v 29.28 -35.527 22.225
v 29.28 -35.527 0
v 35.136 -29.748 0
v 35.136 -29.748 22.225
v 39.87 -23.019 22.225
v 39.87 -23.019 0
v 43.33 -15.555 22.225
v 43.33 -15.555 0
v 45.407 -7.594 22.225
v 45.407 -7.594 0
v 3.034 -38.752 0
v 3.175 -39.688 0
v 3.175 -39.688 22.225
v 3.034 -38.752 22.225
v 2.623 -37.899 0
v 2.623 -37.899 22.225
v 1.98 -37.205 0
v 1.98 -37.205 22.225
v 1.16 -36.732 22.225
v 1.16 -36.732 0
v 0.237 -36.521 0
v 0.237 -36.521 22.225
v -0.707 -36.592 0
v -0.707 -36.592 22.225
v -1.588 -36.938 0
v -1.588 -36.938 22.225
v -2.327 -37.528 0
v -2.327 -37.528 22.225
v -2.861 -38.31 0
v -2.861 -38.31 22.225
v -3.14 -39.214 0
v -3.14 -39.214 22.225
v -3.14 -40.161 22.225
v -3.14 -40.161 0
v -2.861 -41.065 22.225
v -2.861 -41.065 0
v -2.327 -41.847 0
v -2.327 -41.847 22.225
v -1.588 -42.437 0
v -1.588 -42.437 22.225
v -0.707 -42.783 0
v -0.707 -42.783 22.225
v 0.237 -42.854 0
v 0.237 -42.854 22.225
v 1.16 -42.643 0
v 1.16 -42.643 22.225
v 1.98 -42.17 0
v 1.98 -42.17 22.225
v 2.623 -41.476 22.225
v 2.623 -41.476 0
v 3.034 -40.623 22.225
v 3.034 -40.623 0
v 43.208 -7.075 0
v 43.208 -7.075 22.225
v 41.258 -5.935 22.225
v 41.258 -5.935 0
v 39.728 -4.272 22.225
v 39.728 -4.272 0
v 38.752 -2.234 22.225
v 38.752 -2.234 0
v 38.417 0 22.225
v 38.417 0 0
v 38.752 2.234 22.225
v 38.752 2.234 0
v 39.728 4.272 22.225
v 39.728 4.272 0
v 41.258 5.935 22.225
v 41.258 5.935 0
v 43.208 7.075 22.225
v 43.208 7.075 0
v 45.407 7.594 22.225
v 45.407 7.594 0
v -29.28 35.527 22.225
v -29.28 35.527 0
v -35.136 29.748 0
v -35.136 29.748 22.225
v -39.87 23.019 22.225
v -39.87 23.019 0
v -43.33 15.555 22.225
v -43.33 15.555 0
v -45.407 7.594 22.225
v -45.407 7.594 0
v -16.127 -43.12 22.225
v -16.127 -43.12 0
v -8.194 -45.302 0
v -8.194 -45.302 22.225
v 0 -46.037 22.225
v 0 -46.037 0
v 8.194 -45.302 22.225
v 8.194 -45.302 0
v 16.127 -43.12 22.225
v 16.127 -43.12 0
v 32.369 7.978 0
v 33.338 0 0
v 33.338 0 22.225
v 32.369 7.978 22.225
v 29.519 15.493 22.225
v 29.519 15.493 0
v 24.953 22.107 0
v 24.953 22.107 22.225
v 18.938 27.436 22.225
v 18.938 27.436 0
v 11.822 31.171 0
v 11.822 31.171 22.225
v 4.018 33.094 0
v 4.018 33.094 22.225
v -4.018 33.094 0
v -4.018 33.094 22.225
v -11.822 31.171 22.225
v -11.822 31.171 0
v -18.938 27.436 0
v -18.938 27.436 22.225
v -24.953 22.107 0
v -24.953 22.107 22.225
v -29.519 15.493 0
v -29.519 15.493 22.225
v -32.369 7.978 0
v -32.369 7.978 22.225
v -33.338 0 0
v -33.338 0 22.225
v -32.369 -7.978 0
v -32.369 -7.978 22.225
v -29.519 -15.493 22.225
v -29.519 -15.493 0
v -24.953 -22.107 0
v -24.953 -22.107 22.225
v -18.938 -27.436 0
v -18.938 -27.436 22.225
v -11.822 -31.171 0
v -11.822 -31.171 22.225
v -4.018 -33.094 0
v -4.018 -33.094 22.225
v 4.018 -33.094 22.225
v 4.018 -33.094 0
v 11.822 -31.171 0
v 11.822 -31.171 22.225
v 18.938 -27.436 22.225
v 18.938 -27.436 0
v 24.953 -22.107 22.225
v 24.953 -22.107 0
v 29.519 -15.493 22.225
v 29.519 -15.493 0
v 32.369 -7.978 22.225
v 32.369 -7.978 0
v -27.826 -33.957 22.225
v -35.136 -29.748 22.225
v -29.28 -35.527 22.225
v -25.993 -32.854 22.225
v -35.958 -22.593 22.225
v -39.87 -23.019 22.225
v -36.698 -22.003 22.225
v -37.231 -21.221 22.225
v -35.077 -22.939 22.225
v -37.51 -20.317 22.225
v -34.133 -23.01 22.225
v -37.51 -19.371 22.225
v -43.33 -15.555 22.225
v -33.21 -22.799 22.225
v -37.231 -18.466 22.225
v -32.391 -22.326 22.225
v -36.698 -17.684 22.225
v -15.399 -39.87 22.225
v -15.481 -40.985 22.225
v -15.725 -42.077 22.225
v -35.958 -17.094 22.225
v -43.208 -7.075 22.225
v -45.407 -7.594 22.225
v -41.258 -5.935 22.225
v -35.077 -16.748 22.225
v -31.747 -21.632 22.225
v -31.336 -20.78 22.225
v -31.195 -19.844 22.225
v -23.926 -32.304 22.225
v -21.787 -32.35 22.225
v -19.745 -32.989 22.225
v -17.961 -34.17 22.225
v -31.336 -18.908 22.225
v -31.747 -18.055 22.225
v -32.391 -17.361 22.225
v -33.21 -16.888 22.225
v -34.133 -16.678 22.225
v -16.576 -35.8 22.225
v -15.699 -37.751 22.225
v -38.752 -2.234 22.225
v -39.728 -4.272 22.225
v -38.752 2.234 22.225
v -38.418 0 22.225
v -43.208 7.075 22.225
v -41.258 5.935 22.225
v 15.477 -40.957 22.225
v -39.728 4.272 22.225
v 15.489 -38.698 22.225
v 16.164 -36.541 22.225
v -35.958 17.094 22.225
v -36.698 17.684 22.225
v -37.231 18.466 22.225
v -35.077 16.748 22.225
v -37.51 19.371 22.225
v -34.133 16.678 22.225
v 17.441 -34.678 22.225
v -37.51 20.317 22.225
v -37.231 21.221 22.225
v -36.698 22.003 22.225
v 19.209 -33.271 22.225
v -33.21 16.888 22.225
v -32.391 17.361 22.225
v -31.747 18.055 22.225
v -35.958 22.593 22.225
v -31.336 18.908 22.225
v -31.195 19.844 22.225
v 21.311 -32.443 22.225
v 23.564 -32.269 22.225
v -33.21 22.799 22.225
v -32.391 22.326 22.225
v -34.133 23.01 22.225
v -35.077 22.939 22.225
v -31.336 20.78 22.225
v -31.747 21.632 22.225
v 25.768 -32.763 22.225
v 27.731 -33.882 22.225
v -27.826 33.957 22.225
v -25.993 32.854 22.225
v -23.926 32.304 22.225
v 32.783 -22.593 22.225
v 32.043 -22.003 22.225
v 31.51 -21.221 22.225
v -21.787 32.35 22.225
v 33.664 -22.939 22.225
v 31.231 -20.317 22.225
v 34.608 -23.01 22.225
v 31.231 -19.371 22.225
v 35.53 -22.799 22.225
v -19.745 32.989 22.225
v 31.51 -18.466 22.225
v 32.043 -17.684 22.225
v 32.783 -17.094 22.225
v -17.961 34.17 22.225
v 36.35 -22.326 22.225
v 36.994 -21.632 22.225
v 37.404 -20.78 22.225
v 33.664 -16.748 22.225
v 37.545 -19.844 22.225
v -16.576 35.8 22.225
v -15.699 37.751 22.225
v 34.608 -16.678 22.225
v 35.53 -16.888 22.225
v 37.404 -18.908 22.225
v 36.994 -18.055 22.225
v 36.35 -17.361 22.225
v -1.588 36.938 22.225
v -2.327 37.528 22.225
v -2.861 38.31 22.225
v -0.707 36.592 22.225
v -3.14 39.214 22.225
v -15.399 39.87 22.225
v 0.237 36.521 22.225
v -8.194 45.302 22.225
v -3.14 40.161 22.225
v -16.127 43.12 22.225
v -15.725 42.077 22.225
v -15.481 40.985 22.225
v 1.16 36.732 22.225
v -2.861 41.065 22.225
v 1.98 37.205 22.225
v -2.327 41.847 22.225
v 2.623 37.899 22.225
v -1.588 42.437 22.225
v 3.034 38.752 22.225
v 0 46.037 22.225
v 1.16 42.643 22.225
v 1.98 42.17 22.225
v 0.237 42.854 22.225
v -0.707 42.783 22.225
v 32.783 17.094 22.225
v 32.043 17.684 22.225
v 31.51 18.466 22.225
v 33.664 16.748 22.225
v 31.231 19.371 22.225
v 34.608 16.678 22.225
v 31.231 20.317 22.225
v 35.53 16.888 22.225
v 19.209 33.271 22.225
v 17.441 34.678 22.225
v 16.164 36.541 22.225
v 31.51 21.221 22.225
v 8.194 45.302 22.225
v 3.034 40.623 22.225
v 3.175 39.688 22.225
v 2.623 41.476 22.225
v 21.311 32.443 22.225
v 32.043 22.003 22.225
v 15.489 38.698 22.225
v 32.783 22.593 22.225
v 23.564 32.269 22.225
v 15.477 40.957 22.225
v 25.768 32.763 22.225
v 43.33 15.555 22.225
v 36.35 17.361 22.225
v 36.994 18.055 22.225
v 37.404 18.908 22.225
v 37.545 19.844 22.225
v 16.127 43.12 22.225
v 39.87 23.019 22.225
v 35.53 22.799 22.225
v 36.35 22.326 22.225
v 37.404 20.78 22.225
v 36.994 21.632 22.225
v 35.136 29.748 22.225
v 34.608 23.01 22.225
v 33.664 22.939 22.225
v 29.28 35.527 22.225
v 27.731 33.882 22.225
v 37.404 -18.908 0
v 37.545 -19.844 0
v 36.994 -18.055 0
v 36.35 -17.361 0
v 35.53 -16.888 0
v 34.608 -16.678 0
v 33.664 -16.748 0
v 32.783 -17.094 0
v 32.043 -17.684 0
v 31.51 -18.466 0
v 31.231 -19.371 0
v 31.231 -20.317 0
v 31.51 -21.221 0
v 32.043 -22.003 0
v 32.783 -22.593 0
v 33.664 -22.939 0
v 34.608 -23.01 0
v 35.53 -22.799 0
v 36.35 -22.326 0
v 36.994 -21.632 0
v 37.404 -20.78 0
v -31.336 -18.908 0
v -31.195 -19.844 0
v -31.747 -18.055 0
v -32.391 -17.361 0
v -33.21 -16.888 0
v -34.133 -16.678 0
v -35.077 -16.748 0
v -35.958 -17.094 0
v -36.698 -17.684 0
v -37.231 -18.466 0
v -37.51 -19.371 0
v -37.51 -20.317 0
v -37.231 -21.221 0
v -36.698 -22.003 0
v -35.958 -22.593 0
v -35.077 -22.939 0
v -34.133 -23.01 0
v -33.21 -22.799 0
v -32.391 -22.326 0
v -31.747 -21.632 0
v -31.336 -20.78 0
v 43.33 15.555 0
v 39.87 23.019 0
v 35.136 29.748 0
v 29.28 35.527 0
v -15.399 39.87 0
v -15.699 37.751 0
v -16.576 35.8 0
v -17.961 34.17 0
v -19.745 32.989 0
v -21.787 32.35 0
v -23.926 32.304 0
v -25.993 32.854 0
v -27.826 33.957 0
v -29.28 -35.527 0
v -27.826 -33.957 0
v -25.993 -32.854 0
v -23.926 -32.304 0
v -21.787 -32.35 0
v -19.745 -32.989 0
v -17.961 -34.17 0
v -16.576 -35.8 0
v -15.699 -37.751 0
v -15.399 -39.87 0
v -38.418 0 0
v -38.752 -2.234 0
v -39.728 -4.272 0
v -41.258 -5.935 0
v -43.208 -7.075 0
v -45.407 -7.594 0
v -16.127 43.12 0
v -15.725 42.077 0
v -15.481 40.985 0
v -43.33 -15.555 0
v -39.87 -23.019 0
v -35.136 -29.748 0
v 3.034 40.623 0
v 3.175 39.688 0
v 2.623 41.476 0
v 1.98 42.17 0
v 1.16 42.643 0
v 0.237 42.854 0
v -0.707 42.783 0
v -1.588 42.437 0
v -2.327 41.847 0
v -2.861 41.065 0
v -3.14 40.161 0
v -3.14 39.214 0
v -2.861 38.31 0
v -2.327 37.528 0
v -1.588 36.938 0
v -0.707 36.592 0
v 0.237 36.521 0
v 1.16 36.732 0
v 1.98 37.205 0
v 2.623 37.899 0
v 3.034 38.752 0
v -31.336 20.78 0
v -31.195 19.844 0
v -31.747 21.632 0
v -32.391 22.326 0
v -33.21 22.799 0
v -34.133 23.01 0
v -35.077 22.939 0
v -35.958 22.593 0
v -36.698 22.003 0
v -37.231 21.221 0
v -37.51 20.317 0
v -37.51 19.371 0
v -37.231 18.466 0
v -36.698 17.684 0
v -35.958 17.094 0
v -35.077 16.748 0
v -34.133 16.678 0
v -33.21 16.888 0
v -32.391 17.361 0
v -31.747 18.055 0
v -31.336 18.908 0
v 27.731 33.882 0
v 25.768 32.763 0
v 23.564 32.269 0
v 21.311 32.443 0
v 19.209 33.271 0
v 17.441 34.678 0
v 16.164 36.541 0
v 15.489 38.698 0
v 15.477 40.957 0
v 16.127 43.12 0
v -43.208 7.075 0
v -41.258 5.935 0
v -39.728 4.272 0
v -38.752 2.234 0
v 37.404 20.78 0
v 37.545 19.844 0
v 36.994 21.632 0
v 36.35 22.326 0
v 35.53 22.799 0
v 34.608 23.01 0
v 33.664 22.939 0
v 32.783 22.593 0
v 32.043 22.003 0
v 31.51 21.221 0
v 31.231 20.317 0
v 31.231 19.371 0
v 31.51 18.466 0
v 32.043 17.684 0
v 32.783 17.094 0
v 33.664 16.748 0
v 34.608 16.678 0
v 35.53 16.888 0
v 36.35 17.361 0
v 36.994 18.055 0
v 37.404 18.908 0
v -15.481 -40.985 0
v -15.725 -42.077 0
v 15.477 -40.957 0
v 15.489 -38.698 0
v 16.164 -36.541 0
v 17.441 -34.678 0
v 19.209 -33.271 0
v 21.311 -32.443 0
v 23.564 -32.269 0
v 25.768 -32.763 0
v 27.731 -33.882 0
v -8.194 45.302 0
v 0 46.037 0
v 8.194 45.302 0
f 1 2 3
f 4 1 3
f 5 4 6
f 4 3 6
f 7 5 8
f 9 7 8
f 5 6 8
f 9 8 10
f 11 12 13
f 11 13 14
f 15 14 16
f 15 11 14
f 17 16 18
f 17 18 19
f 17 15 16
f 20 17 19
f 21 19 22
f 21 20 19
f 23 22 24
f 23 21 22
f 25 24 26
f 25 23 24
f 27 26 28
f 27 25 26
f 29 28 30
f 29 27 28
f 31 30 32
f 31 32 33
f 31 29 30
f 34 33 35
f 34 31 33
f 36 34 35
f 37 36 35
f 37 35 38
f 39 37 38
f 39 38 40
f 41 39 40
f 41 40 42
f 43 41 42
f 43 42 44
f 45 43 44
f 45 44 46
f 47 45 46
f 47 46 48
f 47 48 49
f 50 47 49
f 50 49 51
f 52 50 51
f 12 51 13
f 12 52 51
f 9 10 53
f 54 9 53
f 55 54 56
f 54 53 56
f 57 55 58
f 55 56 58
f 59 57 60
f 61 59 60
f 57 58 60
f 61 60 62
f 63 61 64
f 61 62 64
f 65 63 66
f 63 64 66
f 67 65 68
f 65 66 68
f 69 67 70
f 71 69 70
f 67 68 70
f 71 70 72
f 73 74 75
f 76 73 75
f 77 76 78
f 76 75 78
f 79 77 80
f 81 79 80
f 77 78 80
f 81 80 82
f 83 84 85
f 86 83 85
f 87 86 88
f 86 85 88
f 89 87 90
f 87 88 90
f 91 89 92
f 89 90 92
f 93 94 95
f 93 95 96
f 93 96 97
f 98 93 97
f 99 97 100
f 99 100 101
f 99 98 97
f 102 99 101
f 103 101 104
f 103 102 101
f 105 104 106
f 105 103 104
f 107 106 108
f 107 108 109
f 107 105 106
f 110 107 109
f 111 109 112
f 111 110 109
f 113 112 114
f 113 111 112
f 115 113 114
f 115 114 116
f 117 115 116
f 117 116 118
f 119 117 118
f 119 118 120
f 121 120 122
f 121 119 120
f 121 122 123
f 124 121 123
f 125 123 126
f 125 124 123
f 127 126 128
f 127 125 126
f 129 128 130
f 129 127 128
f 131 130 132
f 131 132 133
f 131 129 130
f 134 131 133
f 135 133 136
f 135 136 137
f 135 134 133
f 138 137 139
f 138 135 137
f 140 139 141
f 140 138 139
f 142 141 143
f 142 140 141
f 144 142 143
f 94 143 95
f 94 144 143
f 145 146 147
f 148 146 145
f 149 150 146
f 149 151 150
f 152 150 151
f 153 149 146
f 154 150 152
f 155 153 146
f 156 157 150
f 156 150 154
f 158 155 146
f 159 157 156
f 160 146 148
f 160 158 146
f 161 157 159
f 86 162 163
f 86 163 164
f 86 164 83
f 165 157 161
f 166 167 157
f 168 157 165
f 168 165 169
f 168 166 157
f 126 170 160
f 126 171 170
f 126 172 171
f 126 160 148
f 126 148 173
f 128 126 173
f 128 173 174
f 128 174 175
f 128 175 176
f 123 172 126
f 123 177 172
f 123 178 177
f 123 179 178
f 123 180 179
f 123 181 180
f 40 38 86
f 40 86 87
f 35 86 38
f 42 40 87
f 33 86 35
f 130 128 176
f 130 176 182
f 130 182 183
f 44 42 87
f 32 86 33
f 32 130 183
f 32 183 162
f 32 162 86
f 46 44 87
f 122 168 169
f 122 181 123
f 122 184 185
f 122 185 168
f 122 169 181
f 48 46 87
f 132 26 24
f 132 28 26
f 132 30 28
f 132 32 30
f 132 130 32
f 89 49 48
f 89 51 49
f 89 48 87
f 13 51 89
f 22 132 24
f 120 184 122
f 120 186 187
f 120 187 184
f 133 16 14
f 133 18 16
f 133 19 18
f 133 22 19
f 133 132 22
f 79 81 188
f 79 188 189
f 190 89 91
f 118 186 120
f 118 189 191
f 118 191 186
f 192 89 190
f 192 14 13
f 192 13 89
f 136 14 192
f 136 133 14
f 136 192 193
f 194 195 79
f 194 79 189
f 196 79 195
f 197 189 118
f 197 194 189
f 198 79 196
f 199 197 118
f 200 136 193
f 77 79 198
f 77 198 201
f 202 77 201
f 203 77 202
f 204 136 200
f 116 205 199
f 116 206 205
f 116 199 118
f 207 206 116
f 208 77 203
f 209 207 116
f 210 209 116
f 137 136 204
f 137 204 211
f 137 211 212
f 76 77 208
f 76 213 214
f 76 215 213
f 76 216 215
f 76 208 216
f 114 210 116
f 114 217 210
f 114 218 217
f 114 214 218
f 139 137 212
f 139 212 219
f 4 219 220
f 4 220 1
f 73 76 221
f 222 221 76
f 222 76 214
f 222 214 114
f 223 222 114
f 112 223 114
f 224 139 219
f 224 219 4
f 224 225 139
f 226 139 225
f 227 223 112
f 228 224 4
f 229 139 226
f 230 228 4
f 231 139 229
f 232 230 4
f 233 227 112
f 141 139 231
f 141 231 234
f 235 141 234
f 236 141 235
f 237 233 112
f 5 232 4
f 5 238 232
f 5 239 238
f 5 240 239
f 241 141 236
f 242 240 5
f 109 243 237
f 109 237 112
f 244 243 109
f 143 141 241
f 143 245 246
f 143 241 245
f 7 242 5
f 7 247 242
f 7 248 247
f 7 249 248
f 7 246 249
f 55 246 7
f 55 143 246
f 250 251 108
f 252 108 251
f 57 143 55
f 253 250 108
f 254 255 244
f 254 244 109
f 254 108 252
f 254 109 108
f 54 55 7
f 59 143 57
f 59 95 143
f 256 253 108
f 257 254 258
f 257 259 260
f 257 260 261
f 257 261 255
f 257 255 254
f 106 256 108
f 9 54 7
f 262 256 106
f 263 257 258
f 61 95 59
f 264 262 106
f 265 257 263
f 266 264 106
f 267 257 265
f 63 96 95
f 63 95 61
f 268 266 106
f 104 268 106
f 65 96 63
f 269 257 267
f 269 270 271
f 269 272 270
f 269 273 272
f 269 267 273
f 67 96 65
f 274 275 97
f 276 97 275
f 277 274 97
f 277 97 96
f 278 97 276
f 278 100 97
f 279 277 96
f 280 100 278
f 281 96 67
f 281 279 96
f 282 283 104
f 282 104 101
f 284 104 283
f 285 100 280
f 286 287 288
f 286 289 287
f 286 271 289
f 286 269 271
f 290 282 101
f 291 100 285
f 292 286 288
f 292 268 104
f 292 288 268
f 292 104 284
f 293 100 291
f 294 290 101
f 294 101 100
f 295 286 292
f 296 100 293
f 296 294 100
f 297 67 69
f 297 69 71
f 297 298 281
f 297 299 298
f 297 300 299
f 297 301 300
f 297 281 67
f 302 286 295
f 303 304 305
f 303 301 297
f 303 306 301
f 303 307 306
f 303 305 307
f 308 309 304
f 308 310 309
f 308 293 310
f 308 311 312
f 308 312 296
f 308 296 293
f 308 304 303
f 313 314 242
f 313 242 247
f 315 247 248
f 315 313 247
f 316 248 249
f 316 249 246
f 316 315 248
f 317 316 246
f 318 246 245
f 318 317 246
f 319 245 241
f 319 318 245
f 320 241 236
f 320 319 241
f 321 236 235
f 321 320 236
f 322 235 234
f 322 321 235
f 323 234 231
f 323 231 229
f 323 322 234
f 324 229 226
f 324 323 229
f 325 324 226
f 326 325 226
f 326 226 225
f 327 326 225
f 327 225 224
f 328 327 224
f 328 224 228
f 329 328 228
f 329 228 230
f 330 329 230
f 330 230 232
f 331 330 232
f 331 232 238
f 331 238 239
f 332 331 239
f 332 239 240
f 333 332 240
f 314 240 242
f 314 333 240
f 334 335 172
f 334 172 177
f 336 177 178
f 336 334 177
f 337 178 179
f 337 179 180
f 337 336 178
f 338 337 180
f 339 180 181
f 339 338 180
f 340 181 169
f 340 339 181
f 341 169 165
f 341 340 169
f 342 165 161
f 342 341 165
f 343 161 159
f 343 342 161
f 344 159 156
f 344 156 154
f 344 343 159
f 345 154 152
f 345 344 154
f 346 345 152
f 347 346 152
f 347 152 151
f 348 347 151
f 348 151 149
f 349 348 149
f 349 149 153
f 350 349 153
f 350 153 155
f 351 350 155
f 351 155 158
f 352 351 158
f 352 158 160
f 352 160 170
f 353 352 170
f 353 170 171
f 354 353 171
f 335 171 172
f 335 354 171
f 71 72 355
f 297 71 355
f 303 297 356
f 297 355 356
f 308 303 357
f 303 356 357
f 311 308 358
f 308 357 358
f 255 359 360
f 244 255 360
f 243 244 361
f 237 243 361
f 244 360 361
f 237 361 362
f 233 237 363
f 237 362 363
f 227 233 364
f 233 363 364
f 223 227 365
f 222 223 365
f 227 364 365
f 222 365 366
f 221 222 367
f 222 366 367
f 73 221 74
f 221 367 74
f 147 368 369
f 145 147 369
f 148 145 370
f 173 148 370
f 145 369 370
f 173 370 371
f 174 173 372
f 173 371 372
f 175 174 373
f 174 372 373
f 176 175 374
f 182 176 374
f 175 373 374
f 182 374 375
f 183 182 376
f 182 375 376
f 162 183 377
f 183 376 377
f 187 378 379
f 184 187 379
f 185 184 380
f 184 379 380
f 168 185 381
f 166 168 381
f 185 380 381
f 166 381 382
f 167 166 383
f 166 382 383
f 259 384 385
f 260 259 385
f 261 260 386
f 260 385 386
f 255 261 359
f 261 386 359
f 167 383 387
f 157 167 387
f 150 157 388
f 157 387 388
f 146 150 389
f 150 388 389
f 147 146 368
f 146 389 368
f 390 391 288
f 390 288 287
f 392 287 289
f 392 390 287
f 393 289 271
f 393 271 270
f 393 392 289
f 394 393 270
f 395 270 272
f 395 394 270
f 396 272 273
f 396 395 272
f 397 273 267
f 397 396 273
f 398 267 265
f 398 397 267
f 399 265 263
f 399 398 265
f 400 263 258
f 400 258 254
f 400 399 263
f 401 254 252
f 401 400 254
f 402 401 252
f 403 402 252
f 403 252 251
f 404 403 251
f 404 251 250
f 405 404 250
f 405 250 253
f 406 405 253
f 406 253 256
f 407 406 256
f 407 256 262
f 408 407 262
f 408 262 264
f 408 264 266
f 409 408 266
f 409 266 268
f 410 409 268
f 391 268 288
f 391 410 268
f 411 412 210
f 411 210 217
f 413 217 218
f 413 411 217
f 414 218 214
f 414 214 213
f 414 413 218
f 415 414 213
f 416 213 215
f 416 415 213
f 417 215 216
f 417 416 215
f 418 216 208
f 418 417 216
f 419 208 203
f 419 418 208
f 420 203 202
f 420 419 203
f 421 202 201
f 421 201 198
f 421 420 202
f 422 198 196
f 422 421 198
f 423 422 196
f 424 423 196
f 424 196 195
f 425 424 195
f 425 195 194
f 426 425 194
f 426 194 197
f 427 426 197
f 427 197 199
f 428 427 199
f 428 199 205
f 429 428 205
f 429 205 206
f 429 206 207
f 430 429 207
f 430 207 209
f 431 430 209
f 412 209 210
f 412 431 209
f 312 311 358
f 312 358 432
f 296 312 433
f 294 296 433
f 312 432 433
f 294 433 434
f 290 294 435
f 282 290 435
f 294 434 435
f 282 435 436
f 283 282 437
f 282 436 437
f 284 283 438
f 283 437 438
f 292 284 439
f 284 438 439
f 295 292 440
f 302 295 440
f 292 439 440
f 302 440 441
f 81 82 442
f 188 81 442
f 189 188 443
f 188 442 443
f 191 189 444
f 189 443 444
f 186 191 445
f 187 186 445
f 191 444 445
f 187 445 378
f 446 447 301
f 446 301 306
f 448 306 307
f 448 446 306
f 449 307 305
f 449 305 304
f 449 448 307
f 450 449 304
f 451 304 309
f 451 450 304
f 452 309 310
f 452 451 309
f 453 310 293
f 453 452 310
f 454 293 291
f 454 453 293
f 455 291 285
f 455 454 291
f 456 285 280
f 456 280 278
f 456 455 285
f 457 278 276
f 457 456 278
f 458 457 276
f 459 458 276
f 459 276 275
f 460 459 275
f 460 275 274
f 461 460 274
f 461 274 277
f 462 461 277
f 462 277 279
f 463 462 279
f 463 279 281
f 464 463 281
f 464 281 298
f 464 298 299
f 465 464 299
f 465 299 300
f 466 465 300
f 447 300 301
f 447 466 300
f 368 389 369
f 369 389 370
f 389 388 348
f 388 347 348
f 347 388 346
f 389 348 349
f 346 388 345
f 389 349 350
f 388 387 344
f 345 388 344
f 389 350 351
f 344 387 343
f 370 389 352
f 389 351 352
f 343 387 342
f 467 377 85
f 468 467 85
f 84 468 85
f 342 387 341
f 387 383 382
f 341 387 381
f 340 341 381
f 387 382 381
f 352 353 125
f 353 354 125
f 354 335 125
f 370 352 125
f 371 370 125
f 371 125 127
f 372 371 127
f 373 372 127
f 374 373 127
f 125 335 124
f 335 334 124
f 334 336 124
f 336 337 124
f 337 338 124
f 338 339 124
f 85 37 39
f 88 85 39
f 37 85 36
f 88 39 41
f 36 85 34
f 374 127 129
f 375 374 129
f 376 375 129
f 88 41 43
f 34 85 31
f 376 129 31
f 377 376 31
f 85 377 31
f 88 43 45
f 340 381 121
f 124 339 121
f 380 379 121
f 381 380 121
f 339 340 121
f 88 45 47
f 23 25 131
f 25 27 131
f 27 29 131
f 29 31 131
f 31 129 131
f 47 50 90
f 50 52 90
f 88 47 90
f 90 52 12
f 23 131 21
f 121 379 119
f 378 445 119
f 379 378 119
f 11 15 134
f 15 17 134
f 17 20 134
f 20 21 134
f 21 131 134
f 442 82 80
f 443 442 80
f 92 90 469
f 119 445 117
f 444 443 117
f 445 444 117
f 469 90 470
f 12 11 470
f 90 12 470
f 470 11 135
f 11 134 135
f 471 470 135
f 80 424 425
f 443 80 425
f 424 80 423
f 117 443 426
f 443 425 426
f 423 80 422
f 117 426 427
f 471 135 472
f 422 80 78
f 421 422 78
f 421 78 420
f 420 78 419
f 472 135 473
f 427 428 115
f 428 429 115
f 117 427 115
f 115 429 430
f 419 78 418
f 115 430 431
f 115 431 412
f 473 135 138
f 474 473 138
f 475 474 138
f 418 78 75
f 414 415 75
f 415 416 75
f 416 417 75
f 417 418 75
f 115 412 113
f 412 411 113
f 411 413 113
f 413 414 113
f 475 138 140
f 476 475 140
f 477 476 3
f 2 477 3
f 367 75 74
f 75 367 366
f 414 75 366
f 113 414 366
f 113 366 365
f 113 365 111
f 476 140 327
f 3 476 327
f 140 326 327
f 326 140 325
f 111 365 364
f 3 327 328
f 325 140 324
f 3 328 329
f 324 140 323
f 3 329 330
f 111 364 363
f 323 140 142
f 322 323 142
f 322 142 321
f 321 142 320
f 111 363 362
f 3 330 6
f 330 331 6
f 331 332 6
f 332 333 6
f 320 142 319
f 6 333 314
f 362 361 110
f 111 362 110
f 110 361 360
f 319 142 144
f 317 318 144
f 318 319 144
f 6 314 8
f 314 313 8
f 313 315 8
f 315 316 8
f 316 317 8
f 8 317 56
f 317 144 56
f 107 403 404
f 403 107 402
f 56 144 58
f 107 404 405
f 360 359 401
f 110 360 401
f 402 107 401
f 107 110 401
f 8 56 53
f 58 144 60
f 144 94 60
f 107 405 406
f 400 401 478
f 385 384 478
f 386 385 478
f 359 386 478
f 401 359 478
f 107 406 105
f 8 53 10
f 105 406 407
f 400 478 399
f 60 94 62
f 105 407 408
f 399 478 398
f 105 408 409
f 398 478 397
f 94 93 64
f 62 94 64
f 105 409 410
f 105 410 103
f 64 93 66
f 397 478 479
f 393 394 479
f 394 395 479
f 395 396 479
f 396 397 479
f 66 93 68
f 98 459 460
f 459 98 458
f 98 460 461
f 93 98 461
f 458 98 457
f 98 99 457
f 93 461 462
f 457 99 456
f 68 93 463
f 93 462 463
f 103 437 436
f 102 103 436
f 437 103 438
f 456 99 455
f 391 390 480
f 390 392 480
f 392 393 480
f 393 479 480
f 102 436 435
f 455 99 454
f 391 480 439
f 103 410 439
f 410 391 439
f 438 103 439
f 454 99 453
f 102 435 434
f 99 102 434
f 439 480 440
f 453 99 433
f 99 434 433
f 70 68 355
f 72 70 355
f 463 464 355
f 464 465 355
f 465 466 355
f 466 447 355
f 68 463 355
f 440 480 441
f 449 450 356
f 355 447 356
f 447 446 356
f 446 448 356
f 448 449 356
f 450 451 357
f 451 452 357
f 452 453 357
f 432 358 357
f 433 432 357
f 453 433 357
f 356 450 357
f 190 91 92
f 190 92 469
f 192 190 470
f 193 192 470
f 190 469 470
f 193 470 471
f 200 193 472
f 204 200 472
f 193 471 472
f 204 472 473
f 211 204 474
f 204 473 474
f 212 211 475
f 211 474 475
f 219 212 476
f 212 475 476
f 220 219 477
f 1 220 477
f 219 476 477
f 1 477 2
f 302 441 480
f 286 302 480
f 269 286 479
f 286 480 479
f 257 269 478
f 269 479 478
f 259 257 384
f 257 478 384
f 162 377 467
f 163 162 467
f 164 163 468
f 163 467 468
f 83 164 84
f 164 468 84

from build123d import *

# Parameters (mm, degrees)
F0_R     = 3.175
F0_R_2   = 33.3375
F1_DEPTH = 22.225


with BuildPart() as f1:
    # F0 (on Top) → F1 (new body)
    with BuildSketch(Plane.XY):
        with BuildLine():
            ThreePointArc((45.406879, -7.593861), (38.4175, 0), (45.406879, 7.593861))
            ThreePointArc((45.406879, 7.593861), (39.869645, 23.01875), (29.279916, 35.526581))
            ThreePointArc((29.279916, 35.526581), (19.20875, 33.270531), (16.126964, 43.120441))
            ThreePointArc((16.126964, 43.120441), (0, 46.0375), (-16.126964, 43.120441))
            ThreePointArc((-16.126964, 43.120441), (-15.583032, 41.535326), (-15.39875, 39.869645))
            ThreePointArc((-15.39875, 39.869645), (-20.743413, 32.597283), (-29.279916, 35.526581))
            ThreePointArc((-29.279916, 35.526581), (-39.869645, 23.01875), (-45.406879, 7.593861))
            ThreePointArc((-45.406879, 7.593861), (-40.43082, 5.160381), (-38.4175, 0))
            ThreePointArc((-38.4175, 0), (-40.43082, -5.160381), (-45.406879, -7.593861))
            ThreePointArc((-45.406879, -7.593861), (-39.869645, -23.01875), (-29.279916, -35.526581))
            ThreePointArc((-29.279916, -35.526581), (-20.743413, -32.597283), (-15.39875, -39.869645))
            ThreePointArc((-15.39875, -39.869645), (-15.583032, -41.535326), (-16.126964, -43.120441))
            ThreePointArc((-16.126964, -43.120441), (0, -46.0375), (16.126964, -43.120441))
            ThreePointArc((16.126964, -43.120441), (19.20875, -33.270531), (29.279916, -35.526581))
            ThreePointArc((29.279916, -35.526581), (39.869645, -23.01875), (45.406879, -7.593861))
        make_face()
        with Locations((-34.370383, -19.84375)):
            Circle(F0_R, mode=Mode.SUBTRACT)
        with Locations((0, -39.6875)):
            Circle(F0_R, mode=Mode.SUBTRACT)
        with Locations((34.370383, -19.84375)):
            Circle(F0_R, mode=Mode.SUBTRACT)
        with Locations((-34.370383, 19.84375)):
            Circle(F0_R, mode=Mode.SUBTRACT)
        Circle(F0_R_2, mode=Mode.SUBTRACT)
        with Locations((34.370383, 19.84375)):
            Circle(F0_R, mode=Mode.SUBTRACT)
        with Locations((0, 39.6875)):
            Circle(F0_R, mode=Mode.SUBTRACT)
    extrude(amount=F1_DEPTH)


solid = f1.part
